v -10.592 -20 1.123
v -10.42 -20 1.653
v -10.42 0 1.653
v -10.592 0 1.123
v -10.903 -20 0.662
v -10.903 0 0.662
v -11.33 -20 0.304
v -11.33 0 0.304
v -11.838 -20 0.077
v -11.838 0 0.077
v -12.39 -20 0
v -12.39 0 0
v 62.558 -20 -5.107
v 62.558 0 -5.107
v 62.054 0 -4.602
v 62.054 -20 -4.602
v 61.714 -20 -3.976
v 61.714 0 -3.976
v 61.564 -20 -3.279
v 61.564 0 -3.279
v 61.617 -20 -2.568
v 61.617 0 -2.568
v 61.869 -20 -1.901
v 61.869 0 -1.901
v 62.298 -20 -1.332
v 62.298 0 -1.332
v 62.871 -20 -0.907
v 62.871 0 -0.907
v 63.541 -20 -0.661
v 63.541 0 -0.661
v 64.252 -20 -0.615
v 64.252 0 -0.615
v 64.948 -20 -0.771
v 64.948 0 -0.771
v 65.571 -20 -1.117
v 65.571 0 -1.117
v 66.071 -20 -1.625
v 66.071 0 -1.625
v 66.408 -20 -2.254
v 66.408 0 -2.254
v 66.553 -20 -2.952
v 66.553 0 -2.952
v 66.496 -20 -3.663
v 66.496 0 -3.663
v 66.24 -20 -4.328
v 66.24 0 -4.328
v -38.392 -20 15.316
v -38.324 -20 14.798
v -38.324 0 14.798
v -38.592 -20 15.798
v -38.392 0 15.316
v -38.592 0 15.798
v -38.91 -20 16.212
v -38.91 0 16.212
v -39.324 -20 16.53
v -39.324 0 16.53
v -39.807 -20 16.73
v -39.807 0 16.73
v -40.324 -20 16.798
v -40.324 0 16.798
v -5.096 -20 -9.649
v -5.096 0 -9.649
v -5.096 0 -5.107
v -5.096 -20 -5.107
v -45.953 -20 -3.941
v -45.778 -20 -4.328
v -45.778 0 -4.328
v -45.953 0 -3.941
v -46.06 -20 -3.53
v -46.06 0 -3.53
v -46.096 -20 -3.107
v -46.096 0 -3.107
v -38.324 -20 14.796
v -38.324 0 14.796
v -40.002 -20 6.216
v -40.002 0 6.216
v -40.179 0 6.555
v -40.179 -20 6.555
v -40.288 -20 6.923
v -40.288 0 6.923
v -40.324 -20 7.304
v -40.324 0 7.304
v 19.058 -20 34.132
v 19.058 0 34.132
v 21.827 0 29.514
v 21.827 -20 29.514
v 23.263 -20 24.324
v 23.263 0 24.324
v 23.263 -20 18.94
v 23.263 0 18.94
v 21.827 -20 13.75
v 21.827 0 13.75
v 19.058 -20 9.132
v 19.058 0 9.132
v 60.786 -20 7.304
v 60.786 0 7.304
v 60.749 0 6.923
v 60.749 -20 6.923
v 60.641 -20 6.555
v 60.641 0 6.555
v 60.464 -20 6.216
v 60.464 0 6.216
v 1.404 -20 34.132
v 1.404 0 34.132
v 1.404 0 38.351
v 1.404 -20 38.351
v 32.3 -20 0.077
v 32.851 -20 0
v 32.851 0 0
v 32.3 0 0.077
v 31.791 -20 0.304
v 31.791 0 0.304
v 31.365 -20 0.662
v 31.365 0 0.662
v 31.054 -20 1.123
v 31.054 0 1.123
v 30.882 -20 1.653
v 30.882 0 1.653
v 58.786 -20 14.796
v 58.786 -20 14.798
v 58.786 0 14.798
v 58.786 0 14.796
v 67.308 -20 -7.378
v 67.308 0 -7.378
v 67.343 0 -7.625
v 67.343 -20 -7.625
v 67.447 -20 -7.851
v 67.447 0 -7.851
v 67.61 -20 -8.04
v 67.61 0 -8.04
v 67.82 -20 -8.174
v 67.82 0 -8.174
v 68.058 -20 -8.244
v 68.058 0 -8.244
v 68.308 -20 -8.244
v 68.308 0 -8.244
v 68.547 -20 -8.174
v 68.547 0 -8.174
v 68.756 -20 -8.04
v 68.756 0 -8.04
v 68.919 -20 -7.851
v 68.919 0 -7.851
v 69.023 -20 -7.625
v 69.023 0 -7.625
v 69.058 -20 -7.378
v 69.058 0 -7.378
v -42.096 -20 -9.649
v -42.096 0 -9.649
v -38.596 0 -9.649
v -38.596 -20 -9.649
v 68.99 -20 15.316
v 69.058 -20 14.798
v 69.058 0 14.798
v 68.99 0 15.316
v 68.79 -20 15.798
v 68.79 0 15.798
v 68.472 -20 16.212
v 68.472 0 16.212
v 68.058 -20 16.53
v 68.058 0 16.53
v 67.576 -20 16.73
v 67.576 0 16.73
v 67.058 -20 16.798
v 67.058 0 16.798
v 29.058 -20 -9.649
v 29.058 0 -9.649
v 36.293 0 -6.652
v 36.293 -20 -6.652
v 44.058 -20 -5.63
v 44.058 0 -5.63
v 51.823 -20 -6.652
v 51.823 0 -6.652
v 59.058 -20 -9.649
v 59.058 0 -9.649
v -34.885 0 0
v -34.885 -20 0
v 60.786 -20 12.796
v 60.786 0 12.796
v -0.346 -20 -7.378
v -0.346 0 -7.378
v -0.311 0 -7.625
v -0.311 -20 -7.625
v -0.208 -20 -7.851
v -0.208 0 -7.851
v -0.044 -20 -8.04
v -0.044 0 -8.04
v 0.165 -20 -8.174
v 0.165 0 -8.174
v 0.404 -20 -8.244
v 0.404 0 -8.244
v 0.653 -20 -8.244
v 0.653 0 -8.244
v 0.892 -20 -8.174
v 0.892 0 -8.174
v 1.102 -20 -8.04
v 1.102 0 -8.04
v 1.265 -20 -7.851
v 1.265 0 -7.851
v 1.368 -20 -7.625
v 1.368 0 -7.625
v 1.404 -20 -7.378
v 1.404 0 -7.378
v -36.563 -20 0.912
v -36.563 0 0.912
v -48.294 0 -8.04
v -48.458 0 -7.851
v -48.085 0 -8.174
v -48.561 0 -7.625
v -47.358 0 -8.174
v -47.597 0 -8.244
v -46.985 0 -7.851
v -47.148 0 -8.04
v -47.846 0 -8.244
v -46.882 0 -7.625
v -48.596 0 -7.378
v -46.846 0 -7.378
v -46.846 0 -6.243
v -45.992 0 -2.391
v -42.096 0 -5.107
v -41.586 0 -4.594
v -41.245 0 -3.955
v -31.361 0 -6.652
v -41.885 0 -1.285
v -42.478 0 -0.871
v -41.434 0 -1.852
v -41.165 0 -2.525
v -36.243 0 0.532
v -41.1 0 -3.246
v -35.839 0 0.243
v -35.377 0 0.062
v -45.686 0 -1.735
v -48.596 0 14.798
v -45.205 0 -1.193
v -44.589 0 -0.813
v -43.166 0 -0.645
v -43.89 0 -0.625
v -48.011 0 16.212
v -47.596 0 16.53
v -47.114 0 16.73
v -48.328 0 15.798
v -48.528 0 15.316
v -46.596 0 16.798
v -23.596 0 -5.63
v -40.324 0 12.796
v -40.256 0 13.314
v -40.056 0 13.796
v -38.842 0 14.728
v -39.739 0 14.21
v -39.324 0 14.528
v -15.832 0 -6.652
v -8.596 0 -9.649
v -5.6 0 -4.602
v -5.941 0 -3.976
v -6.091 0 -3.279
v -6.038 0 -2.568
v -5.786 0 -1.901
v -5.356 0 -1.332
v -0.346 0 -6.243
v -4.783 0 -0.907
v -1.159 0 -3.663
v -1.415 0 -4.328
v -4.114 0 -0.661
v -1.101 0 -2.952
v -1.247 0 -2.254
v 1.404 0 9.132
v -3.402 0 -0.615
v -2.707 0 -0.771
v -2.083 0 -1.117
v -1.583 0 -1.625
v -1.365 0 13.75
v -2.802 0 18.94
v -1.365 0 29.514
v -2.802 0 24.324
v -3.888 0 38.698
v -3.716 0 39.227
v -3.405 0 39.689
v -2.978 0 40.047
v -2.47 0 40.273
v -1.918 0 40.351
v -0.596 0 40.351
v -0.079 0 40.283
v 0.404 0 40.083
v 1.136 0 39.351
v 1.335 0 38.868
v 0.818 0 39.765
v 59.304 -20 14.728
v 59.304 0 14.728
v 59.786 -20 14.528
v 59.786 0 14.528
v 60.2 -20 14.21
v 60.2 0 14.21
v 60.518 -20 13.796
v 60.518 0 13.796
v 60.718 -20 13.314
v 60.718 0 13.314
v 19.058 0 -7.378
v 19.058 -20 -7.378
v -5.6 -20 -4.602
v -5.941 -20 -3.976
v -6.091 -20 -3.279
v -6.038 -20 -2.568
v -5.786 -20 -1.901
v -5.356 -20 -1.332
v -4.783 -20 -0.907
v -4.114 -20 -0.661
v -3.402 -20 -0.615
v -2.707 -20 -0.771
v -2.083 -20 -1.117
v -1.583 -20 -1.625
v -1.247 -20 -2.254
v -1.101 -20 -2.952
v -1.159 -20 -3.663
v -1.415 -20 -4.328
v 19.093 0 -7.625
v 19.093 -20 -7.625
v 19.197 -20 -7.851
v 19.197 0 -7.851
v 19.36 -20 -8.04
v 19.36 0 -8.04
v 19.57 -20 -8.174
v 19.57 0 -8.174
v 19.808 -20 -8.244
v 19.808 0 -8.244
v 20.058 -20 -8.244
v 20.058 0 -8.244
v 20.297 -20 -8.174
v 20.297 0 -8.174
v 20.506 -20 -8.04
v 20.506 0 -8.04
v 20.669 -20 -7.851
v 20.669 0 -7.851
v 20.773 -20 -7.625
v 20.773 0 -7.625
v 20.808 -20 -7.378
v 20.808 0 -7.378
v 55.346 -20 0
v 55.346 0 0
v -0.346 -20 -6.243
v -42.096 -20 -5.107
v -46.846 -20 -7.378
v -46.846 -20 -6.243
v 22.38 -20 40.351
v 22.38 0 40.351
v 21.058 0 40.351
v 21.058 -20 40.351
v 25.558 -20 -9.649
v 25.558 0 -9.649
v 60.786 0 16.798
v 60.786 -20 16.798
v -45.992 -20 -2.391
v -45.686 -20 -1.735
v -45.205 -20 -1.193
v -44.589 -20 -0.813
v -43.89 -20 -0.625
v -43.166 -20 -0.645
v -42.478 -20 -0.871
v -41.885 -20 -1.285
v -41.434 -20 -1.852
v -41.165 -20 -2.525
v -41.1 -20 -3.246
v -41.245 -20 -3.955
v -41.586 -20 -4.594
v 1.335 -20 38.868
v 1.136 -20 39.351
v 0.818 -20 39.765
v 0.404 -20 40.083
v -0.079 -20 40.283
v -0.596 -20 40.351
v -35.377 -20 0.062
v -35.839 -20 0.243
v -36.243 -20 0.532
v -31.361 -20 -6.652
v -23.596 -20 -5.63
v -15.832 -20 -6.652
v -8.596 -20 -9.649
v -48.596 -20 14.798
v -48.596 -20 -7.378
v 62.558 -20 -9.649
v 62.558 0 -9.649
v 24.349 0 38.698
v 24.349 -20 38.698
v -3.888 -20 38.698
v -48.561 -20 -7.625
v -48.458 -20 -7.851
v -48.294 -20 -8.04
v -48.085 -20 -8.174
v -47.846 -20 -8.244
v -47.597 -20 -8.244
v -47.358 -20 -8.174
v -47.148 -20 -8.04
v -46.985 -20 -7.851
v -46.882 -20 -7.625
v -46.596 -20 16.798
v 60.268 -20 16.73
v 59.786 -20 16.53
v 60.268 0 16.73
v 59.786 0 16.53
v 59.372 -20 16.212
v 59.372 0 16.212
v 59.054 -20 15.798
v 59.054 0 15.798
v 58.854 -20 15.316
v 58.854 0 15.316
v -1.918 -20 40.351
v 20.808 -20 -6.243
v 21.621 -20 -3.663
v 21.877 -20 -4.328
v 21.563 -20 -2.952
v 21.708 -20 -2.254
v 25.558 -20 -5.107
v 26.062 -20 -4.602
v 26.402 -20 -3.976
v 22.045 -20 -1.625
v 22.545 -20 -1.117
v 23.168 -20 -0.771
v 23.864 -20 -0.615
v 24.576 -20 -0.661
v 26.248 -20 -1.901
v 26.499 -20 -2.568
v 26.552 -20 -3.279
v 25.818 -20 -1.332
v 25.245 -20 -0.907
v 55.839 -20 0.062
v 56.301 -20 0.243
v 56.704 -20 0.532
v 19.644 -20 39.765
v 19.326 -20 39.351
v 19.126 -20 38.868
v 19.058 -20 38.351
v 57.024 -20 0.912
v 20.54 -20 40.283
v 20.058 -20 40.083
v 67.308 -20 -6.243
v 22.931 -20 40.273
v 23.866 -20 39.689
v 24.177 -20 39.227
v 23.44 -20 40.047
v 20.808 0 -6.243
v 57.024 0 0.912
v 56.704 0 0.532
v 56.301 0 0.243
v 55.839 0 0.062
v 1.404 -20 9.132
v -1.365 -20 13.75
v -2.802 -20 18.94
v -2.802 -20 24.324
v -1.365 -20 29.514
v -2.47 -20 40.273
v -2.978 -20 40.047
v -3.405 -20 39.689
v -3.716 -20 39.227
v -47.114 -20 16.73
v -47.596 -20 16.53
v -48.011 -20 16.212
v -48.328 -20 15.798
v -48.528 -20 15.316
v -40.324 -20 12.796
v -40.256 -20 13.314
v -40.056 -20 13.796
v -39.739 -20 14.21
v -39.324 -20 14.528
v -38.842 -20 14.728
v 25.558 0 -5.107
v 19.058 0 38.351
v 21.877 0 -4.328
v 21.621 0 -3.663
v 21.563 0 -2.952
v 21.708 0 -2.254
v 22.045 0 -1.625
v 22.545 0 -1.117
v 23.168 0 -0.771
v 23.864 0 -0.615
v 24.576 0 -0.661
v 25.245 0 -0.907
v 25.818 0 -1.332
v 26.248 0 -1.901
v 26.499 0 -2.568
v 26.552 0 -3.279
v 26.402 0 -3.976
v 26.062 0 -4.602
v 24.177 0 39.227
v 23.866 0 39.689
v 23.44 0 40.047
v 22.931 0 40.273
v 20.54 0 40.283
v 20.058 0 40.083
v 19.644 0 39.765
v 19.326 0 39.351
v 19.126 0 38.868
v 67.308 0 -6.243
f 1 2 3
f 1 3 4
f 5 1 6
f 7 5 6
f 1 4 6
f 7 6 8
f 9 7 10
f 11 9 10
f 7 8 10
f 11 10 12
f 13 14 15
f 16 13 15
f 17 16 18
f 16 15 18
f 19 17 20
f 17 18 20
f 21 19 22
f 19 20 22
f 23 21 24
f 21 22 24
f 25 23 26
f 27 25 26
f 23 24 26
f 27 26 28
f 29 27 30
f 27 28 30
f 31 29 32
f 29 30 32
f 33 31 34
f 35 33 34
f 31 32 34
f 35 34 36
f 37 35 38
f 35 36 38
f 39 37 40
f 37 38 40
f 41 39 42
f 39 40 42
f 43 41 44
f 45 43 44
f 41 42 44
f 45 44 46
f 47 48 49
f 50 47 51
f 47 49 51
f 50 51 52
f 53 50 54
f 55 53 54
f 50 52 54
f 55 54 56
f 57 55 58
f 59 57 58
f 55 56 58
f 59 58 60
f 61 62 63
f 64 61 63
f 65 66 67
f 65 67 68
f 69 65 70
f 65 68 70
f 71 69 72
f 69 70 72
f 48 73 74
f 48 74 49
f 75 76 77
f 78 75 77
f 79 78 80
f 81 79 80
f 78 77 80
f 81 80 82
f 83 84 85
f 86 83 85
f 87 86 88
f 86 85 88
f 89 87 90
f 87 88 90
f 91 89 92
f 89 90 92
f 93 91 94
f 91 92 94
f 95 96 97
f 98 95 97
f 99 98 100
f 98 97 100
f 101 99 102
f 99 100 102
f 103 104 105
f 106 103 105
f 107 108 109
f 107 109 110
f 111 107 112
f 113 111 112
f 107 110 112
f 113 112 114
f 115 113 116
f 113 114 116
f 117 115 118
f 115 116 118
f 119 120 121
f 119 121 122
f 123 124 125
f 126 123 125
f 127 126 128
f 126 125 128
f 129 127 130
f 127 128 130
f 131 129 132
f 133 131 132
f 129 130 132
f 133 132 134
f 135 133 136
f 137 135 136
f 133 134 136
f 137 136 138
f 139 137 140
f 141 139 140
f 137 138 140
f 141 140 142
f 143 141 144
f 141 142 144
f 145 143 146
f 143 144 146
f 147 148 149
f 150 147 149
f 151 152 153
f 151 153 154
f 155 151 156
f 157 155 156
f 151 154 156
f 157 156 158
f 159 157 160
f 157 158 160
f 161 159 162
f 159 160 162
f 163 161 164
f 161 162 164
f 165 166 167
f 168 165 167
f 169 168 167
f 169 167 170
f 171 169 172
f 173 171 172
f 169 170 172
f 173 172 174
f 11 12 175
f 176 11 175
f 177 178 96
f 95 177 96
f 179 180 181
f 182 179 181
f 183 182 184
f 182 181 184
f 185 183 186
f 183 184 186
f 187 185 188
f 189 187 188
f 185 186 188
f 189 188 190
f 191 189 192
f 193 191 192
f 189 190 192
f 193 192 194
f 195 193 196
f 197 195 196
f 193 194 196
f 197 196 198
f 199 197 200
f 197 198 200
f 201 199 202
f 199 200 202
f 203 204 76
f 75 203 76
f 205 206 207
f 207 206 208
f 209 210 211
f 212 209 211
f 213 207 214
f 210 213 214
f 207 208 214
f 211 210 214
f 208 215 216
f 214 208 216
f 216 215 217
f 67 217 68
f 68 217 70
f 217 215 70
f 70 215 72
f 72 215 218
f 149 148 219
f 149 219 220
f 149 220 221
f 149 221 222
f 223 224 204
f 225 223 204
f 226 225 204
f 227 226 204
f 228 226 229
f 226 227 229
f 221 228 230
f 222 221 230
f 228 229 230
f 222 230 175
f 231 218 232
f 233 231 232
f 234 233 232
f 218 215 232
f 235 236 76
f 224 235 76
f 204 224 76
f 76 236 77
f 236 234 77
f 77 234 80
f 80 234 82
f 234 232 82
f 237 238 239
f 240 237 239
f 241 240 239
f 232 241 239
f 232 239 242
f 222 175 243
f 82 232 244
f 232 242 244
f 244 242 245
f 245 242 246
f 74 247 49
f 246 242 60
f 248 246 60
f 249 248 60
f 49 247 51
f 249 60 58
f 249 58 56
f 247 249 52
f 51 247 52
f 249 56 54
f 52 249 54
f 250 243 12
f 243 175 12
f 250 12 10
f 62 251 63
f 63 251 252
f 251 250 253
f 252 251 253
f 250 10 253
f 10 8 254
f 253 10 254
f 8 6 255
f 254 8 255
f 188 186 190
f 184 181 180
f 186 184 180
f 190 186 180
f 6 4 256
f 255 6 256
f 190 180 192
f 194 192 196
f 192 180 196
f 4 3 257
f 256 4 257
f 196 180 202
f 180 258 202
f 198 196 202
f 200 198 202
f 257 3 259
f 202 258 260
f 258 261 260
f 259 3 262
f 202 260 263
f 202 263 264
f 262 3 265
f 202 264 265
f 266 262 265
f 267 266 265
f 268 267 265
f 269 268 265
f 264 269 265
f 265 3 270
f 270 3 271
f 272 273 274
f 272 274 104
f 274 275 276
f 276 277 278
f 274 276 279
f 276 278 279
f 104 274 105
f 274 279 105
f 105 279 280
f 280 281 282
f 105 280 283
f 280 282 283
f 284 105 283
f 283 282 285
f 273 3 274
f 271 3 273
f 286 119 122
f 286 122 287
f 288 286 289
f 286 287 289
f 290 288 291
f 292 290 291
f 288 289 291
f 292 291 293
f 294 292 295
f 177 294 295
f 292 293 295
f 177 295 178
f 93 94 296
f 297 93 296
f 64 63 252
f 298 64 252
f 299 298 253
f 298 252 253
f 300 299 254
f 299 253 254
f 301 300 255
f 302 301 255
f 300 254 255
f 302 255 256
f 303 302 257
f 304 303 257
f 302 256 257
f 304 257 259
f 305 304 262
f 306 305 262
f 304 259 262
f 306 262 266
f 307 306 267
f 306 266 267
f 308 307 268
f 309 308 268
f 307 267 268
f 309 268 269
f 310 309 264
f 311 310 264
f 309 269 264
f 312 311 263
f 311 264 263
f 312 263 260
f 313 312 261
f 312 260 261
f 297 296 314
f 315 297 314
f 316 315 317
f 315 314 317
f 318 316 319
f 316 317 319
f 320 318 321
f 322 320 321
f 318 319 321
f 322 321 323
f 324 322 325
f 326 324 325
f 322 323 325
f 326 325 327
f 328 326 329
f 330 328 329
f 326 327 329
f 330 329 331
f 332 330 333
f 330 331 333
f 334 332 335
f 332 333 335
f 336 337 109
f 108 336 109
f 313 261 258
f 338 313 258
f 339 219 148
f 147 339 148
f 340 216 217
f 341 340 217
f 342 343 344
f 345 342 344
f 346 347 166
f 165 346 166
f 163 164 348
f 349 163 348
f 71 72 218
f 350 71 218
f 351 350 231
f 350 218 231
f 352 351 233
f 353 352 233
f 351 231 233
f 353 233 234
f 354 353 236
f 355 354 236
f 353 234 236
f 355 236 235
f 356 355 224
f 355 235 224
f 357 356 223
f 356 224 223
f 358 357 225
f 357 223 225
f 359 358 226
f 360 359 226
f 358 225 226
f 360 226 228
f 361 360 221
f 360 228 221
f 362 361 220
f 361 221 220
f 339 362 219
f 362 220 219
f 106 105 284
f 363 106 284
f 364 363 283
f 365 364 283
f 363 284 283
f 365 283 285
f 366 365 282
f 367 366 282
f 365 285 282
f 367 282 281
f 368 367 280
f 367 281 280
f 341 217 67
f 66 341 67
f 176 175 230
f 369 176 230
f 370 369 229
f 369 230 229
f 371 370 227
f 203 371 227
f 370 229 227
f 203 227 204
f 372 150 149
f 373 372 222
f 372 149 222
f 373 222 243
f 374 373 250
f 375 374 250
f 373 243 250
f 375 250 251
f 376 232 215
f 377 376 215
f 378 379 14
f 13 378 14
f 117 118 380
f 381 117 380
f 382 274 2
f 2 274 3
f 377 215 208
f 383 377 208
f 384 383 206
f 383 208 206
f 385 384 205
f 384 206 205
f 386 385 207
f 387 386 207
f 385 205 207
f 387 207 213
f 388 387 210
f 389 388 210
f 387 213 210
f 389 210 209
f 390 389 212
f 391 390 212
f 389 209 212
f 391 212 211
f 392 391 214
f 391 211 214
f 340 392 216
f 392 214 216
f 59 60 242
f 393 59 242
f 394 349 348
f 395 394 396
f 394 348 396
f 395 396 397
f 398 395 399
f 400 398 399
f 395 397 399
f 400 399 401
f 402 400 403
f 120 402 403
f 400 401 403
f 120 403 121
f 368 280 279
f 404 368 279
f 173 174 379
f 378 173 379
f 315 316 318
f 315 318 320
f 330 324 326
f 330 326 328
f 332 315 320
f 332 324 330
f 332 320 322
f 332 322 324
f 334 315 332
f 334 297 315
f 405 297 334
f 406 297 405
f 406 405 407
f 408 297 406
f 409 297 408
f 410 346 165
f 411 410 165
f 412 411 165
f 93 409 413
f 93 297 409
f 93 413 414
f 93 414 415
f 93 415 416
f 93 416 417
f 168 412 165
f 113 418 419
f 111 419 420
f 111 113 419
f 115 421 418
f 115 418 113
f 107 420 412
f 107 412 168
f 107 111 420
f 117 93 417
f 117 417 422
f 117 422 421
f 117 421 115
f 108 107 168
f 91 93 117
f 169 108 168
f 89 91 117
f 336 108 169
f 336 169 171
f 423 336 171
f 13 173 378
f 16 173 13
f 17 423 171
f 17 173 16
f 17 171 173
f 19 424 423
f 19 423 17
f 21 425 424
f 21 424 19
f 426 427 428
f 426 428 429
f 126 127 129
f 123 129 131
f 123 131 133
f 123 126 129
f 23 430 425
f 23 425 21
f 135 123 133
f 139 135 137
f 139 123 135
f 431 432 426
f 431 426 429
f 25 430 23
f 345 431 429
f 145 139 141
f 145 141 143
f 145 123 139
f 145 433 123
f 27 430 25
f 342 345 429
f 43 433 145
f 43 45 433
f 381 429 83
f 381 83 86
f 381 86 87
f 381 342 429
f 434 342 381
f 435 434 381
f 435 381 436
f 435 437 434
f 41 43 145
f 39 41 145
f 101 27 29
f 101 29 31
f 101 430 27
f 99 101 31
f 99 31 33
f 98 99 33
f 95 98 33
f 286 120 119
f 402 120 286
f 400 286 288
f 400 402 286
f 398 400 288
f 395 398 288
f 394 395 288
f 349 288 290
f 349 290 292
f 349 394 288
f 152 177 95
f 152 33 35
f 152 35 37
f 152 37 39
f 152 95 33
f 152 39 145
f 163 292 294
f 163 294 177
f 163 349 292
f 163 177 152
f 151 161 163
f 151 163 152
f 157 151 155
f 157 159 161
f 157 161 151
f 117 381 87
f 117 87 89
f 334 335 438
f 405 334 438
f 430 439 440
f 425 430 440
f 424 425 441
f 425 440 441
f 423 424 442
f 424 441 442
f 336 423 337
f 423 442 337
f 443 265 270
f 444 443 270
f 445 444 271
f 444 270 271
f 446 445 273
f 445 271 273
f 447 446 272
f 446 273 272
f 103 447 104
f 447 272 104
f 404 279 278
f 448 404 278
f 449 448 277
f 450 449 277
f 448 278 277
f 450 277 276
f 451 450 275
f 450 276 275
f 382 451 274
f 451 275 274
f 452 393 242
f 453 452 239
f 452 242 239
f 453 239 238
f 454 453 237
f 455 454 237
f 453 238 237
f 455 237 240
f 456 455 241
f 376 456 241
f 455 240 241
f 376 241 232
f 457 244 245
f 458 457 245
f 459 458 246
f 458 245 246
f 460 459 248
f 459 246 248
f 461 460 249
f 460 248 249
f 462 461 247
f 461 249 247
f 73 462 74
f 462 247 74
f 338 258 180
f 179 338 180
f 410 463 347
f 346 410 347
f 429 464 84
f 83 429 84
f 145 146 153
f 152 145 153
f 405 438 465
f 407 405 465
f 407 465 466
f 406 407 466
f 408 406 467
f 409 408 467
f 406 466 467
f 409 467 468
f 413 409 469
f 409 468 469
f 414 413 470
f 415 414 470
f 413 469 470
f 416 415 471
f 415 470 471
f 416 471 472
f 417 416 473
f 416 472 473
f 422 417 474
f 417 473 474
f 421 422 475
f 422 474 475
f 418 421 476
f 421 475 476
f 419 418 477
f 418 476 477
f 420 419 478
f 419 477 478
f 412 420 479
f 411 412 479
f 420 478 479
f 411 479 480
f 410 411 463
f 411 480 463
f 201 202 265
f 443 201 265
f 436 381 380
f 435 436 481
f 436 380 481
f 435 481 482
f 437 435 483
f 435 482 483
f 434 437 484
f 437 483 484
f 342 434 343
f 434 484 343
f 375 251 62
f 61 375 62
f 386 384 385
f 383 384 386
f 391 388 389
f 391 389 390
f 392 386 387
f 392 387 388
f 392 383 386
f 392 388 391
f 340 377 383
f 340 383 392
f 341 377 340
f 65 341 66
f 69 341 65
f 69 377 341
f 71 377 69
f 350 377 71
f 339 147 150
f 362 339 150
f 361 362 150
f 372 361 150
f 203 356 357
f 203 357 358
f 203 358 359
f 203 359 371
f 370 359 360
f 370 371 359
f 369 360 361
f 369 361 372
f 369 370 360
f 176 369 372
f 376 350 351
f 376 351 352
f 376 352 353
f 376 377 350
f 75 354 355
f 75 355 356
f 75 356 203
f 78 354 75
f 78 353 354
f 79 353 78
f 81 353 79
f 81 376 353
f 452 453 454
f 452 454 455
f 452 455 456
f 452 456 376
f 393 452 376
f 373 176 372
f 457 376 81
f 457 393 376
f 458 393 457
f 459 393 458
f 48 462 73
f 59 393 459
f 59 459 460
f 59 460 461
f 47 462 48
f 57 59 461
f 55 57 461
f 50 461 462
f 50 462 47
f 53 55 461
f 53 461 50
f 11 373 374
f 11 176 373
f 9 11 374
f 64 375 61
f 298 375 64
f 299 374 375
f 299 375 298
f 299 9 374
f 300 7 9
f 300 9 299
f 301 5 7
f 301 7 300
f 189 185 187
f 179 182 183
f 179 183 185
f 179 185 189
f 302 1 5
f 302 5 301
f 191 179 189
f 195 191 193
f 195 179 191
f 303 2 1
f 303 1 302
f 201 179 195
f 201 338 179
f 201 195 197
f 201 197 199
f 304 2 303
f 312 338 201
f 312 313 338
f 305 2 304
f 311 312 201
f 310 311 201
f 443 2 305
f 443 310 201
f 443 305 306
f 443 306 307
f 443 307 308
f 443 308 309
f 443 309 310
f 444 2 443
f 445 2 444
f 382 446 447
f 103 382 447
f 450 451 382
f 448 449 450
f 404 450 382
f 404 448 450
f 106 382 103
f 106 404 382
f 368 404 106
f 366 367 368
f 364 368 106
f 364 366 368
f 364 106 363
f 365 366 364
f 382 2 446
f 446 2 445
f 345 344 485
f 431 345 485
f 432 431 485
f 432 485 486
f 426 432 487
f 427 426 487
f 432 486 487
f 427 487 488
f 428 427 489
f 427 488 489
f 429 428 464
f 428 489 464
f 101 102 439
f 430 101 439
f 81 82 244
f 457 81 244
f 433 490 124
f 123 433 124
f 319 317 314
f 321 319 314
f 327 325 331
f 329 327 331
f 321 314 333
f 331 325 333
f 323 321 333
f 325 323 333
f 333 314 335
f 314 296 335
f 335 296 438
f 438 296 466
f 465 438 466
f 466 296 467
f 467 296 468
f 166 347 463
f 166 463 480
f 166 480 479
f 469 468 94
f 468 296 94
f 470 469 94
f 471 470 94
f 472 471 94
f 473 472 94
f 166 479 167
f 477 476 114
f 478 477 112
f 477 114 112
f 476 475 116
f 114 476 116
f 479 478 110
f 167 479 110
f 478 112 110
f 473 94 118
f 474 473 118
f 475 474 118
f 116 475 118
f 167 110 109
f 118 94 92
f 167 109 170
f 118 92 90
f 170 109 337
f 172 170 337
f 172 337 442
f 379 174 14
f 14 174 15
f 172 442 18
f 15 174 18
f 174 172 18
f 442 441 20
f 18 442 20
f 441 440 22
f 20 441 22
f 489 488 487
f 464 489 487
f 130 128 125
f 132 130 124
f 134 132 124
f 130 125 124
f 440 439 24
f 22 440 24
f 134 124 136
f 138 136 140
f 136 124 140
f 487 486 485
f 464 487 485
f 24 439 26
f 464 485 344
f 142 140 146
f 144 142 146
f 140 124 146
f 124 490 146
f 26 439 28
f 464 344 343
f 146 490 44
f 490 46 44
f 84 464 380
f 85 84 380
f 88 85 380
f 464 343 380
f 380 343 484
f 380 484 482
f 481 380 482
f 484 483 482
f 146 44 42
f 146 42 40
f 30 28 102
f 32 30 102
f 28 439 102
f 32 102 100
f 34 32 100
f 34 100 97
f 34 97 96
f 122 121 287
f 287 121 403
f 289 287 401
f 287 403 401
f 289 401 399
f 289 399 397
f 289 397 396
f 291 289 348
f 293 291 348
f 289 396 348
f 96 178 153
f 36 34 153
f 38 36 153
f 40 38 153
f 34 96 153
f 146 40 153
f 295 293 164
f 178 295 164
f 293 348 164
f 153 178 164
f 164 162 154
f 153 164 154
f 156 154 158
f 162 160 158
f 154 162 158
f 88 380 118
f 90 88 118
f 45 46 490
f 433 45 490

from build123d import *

# Parameters (mm, degrees)
F1_DEPTH = 20


with BuildPart() as f1:
    # F0 (on Front) → F1 (new body)
    with BuildSketch(Plane.XZ):
        with BuildLine():
            ThreePointArc((-38.324347, 14.797959), (-38.910133, 16.212173), (-40.324347, 16.797959))
            Line((-40.324347, 16.797959), (-46.596433, 16.797959))
            ThreePointArc((-46.596433, 16.797959), (-48.010647, 16.212173), (-48.596433, 14.797959))
            Line((-48.596433, 14.797959), (-48.596433, -7.37829))
            ThreePointArc((-48.596433, -7.37829), (-47.721433, -8.25329), (-46.846433, -7.37829))
            Line((-46.846433, -7.37829), (-46.846433, -6.242791))
            Line((-46.846433, -6.242791), (-45.777943, -4.328363))
            ThreePointArc((-45.777943, -4.328363), (-46.015501, -3.738253), (-46.096433, -3.107292))
            ThreePointArc((-46.096433, -3.107292), (-42.478399, -0.871224), (-42.096433, -5.107292))
            Line((-42.096433, -5.107292), (-42.096433, -9.649287))
            Line((-42.096433, -9.649287), (-38.596433, -9.649287))
            ThreePointArc((-38.596433, -9.649287), (-23.596433, -5.63005), (-8.596433, -9.649287))
            Line((-8.596433, -9.649287), (-5.096433, -9.649287))
            Line((-5.096433, -9.649287), (-5.096433, -5.107292))
            ThreePointArc((-5.096433, -5.107292), (-4.113924, -0.661437), (-1.414923, -4.328363))
            Line((-1.414923, -4.328363), (-0.346433, -6.242791))
            Line((-0.346433, -6.242791), (-0.346433, -7.37829))
            ThreePointArc((-0.346433, -7.37829), (0.528567, -8.25329), (1.403567, -7.37829))
            Line((1.403567, -7.37829), (1.403567, -5.019944))
            Line((1.403567, -5.019944), (1.403567, 9.131996))
            ThreePointArc((1.403567, 9.131996), (-2.983938, 21.631996), (1.403567, 34.131996))
            Line((1.403567, 34.131996), (1.403567, 38.350713))
            ThreePointArc((1.403567, 38.350713), (0.81778, 39.764926), (-0.596433, 40.350713))
            Line((-0.596433, 40.350713), (-1.918234, 40.350713))
            ThreePointArc((-1.918234, 40.350713), (-3.203809, 39.882801), (-3.88785, 38.698009))
            Line((-3.88785, 38.698009), (-10.419936, 1.652704))
            ThreePointArc((-10.419936, 1.652704), (-11.103977, 0.467911), (-12.389552, 0))
            Line((-12.389552, 0), (-34.884615, 0))
            ThreePointArc((-34.884615, 0), (-35.839467, 0.242656), (-36.562618, 0.911742))
            Line((-36.562618, 0.911742), (-40.00235, 6.215519))
            ThreePointArc((-40.00235, 6.215519), (-40.242159, 6.73633), (-40.324347, 7.303778))
            Line((-40.324347, 7.303778), (-40.324347, 12.796261))
            ThreePointArc((-40.324347, 12.796261), (-39.73856, 14.210475), (-38.324347, 14.796261))
            Line((-38.324347, 14.796261), (-38.324347, 14.797959))
        make_face()
        with BuildLine():
            Line((58.785936, 14.797959), (58.785936, 14.796261))
            ThreePointArc((58.785936, 14.796261), (60.20015, 14.210475), (60.785936, 12.796261))
            Line((60.785936, 12.796261), (60.785936, 7.303778))
            ThreePointArc((60.785936, 7.303778), (60.703748, 6.73633), (60.463939, 6.215519))
            Line((60.463939, 6.215519), (57.024207, 0.911742))
            ThreePointArc((57.024207, 0.911742), (56.301056, 0.242656), (55.346204, 0))
            Line((55.346204, 0), (32.851141, 0))
            ThreePointArc((32.851141, 0), (31.565566, 0.467911), (30.881526, 1.652704))
            Line((30.881526, 1.652704), (24.349439, 38.698009))
            ThreePointArc((24.349439, 38.698009), (23.665398, 39.882801), (22.379823, 40.350713))
            Line((22.379823, 40.350713), (21.058022, 40.350713))
            ThreePointArc((21.058022, 40.350713), (19.643809, 39.764926), (19.058022, 38.350713))
            Line((19.058022, 38.350713), (19.058022, 34.131996))
            ThreePointArc((19.058022, 34.131996), (23.445527, 21.631996), (19.058022, 9.131996))
            Line((19.058022, 9.131996), (19.058022, -7.37829))
            ThreePointArc((19.058022, -7.37829), (19.933022, -8.25329), (20.808022, -7.37829))
            Line((20.808022, -7.37829), (20.808022, -6.242791))
            Line((20.808022, -6.242791), (21.876512, -4.328363))
            ThreePointArc((21.876512, -4.328363), (24.575513, -0.661437), (25.558022, -5.107292))
            Line((25.558022, -5.107292), (25.558022, -9.649287))
            Line((25.558022, -9.649287), (29.058022, -9.649287))
            ThreePointArc((29.058022, -9.649287), (44.058022, -5.63005), (59.058022, -9.649287))
            Line((59.058022, -9.649287), (62.558022, -9.649287))
            Line((62.558022, -9.649287), (62.558022, -5.107292))
            ThreePointArc((62.558022, -5.107292), (63.540532, -0.661437), (66.239532, -4.328363))
            Line((66.239532, -4.328363), (67.308022, -6.242791))
            Line((67.308022, -6.242791), (67.308022, -7.37829))
            ThreePointArc((67.308022, -7.37829), (68.183022, -8.25329), (69.058022, -7.37829))
            Line((69.058022, -7.37829), (69.058022, 14.797959))
            ThreePointArc((69.058022, 14.797959), (68.472236, 16.212173), (67.058022, 16.797959))
            Line((67.058022, 16.797959), (60.785936, 16.797959))
            ThreePointArc((60.785936, 16.797959), (59.371722, 16.212173), (58.785936, 14.797959))
        make_face()
    extrude(amount=F1_DEPTH)


solid = f1.part
